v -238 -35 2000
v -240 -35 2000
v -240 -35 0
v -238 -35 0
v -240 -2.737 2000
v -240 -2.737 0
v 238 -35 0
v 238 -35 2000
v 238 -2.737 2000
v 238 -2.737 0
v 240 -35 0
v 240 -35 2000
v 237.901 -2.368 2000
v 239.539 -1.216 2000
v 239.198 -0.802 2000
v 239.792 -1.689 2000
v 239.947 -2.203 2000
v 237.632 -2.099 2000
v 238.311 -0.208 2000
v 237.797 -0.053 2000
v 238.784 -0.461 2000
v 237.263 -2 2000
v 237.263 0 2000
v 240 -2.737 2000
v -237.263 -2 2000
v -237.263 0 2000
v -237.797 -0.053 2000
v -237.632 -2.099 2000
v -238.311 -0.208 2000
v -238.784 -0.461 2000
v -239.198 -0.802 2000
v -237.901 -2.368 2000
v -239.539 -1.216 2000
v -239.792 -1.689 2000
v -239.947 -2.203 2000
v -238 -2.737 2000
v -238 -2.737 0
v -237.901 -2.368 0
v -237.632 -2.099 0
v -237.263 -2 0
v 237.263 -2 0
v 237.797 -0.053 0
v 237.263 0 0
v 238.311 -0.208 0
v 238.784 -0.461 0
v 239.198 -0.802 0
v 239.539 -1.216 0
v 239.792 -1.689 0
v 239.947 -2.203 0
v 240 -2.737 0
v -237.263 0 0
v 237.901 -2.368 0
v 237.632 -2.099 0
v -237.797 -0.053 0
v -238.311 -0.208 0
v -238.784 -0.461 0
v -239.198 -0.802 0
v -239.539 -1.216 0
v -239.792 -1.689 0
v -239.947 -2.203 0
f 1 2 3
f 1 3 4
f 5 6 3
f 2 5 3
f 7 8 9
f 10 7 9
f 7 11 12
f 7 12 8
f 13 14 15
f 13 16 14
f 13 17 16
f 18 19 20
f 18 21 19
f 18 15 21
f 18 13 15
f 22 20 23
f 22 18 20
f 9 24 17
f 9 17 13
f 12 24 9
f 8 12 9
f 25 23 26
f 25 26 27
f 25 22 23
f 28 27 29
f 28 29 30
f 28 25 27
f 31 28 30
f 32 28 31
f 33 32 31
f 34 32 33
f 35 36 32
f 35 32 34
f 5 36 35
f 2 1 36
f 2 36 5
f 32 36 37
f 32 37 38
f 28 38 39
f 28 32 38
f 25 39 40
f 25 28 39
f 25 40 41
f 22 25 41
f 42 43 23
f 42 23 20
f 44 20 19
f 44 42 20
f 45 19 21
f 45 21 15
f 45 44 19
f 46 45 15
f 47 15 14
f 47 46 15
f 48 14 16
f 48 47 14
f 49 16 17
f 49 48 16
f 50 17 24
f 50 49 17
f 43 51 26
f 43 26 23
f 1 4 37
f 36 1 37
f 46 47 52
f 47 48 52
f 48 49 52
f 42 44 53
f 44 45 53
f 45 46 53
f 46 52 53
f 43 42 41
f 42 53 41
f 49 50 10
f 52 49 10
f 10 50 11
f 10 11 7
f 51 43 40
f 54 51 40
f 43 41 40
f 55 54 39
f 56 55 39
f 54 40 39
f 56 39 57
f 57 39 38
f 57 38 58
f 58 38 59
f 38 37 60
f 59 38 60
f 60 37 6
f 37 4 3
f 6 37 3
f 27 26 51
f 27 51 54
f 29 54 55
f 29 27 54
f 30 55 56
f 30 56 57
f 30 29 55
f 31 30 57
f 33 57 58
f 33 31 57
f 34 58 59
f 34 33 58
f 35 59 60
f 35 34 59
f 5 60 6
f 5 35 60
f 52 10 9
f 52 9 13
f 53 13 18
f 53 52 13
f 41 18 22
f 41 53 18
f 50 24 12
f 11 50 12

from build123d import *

# Parameters (mm, degrees)
SKETCH1_W                      = 480
SKETCH1_H                      = 2
BASE_FLANGE1_DEPTH             = 2000
EDGE_FLANGE1_STRIP_W           = 9.4732
EDGE_FLANGE1_STRIP_H           = 2
EDGE_FLANGE1_STRIP_CUT_DEPTH   = 2000
EDGE_FLANGE1_STRIP_2_W         = 9.4732
EDGE_FLANGE1_STRIP_2_H         = 2
EDGE_FLANGE1_STRIP_CUT_2_DEPTH = 2000
EDGE_FLANGE1_DEPTH             = 2000
EDGE_FLANGE1_BEND_DEPTH        = 2000


# Sheet-metal steps are written as plain solids
with BuildPart() as part:
    # Sketch1 → Base-Flange1 (new body)
    with BuildSketch(Plane.XY):
        with Locations((0, -1)):
            Rectangle(SKETCH1_W, SKETCH1_H)
    extrude(amount=BASE_FLANGE1_DEPTH)

    # Edge-Flange1 strip (across the edge) → Edge-Flange1 strip cut (cut)
    with BuildSketch(Plane(origin=(240, -2, 0), x_dir=(-1, 0, 0), z_dir=(0, 0, 1))):
        with Locations((-2, -1)):
            Rectangle(EDGE_FLANGE1_STRIP_W, EDGE_FLANGE1_STRIP_H)
    extrude(amount=EDGE_FLANGE1_STRIP_CUT_DEPTH, mode=Mode.SUBTRACT)

    # Edge-Flange1 strip 2 (across the edge) → Edge-Flange1 strip cut 2 (cut)
    with BuildSketch(Plane(origin=(-240, -2, 2000), x_dir=(1, 0, 0), z_dir=(0, 0, -1))):
        with Locations((-2, -1)):
            Rectangle(EDGE_FLANGE1_STRIP_2_W, EDGE_FLANGE1_STRIP_2_H)
    extrude(amount=EDGE_FLANGE1_STRIP_CUT_2_DEPTH, mode=Mode.SUBTRACT)

    # Edge-Flange1 section (across the edge) → Edge-Flange1 (add)
    with BuildSketch(Plane(origin=(240, -2, 0), x_dir=(-1, 0, 0), z_dir=(0, 0, 1))):
        with BuildLine():
            Line((0, 0.7366), (0, 33))
            Line((0, 33), (2, 33))
            Line((2, 33), (2, 0.7366))
            ThreePointArc((2, 0.7366), (2.215745145, 0.215745145), (2.7366, 0))
            Line((2.7366, 0), (2.7366, -2))
            ThreePointArc((2.7366, -2), (0.801531583, -1.198468417), (0, 0.7366))
        make_face()
    extrude(amount=EDGE_FLANGE1_DEPTH)

    # Edge-Flange1 section 2 (across the edge) → Edge-Flange1 bend (add)
    with BuildSketch(Plane(origin=(-240, -2, 2000), x_dir=(1, 0, 0), z_dir=(0, 0, -1))):
        with BuildLine():
            Line((0, 0.7366), (0, 33))
            Line((0, 33), (2, 33))
            Line((2, 33), (2, 0.7366))
            ThreePointArc((2, 0.7366), (2.215745145, 0.215745145), (2.7366, 0))
            Line((2.7366, 0), (2.7366, -2))
            ThreePointArc((2.7366, -2), (0.801531583, -1.198468417), (0, 0.7366))
        make_face()
    extrude(amount=EDGE_FLANGE1_BEND_DEPTH)


solid = part.part
